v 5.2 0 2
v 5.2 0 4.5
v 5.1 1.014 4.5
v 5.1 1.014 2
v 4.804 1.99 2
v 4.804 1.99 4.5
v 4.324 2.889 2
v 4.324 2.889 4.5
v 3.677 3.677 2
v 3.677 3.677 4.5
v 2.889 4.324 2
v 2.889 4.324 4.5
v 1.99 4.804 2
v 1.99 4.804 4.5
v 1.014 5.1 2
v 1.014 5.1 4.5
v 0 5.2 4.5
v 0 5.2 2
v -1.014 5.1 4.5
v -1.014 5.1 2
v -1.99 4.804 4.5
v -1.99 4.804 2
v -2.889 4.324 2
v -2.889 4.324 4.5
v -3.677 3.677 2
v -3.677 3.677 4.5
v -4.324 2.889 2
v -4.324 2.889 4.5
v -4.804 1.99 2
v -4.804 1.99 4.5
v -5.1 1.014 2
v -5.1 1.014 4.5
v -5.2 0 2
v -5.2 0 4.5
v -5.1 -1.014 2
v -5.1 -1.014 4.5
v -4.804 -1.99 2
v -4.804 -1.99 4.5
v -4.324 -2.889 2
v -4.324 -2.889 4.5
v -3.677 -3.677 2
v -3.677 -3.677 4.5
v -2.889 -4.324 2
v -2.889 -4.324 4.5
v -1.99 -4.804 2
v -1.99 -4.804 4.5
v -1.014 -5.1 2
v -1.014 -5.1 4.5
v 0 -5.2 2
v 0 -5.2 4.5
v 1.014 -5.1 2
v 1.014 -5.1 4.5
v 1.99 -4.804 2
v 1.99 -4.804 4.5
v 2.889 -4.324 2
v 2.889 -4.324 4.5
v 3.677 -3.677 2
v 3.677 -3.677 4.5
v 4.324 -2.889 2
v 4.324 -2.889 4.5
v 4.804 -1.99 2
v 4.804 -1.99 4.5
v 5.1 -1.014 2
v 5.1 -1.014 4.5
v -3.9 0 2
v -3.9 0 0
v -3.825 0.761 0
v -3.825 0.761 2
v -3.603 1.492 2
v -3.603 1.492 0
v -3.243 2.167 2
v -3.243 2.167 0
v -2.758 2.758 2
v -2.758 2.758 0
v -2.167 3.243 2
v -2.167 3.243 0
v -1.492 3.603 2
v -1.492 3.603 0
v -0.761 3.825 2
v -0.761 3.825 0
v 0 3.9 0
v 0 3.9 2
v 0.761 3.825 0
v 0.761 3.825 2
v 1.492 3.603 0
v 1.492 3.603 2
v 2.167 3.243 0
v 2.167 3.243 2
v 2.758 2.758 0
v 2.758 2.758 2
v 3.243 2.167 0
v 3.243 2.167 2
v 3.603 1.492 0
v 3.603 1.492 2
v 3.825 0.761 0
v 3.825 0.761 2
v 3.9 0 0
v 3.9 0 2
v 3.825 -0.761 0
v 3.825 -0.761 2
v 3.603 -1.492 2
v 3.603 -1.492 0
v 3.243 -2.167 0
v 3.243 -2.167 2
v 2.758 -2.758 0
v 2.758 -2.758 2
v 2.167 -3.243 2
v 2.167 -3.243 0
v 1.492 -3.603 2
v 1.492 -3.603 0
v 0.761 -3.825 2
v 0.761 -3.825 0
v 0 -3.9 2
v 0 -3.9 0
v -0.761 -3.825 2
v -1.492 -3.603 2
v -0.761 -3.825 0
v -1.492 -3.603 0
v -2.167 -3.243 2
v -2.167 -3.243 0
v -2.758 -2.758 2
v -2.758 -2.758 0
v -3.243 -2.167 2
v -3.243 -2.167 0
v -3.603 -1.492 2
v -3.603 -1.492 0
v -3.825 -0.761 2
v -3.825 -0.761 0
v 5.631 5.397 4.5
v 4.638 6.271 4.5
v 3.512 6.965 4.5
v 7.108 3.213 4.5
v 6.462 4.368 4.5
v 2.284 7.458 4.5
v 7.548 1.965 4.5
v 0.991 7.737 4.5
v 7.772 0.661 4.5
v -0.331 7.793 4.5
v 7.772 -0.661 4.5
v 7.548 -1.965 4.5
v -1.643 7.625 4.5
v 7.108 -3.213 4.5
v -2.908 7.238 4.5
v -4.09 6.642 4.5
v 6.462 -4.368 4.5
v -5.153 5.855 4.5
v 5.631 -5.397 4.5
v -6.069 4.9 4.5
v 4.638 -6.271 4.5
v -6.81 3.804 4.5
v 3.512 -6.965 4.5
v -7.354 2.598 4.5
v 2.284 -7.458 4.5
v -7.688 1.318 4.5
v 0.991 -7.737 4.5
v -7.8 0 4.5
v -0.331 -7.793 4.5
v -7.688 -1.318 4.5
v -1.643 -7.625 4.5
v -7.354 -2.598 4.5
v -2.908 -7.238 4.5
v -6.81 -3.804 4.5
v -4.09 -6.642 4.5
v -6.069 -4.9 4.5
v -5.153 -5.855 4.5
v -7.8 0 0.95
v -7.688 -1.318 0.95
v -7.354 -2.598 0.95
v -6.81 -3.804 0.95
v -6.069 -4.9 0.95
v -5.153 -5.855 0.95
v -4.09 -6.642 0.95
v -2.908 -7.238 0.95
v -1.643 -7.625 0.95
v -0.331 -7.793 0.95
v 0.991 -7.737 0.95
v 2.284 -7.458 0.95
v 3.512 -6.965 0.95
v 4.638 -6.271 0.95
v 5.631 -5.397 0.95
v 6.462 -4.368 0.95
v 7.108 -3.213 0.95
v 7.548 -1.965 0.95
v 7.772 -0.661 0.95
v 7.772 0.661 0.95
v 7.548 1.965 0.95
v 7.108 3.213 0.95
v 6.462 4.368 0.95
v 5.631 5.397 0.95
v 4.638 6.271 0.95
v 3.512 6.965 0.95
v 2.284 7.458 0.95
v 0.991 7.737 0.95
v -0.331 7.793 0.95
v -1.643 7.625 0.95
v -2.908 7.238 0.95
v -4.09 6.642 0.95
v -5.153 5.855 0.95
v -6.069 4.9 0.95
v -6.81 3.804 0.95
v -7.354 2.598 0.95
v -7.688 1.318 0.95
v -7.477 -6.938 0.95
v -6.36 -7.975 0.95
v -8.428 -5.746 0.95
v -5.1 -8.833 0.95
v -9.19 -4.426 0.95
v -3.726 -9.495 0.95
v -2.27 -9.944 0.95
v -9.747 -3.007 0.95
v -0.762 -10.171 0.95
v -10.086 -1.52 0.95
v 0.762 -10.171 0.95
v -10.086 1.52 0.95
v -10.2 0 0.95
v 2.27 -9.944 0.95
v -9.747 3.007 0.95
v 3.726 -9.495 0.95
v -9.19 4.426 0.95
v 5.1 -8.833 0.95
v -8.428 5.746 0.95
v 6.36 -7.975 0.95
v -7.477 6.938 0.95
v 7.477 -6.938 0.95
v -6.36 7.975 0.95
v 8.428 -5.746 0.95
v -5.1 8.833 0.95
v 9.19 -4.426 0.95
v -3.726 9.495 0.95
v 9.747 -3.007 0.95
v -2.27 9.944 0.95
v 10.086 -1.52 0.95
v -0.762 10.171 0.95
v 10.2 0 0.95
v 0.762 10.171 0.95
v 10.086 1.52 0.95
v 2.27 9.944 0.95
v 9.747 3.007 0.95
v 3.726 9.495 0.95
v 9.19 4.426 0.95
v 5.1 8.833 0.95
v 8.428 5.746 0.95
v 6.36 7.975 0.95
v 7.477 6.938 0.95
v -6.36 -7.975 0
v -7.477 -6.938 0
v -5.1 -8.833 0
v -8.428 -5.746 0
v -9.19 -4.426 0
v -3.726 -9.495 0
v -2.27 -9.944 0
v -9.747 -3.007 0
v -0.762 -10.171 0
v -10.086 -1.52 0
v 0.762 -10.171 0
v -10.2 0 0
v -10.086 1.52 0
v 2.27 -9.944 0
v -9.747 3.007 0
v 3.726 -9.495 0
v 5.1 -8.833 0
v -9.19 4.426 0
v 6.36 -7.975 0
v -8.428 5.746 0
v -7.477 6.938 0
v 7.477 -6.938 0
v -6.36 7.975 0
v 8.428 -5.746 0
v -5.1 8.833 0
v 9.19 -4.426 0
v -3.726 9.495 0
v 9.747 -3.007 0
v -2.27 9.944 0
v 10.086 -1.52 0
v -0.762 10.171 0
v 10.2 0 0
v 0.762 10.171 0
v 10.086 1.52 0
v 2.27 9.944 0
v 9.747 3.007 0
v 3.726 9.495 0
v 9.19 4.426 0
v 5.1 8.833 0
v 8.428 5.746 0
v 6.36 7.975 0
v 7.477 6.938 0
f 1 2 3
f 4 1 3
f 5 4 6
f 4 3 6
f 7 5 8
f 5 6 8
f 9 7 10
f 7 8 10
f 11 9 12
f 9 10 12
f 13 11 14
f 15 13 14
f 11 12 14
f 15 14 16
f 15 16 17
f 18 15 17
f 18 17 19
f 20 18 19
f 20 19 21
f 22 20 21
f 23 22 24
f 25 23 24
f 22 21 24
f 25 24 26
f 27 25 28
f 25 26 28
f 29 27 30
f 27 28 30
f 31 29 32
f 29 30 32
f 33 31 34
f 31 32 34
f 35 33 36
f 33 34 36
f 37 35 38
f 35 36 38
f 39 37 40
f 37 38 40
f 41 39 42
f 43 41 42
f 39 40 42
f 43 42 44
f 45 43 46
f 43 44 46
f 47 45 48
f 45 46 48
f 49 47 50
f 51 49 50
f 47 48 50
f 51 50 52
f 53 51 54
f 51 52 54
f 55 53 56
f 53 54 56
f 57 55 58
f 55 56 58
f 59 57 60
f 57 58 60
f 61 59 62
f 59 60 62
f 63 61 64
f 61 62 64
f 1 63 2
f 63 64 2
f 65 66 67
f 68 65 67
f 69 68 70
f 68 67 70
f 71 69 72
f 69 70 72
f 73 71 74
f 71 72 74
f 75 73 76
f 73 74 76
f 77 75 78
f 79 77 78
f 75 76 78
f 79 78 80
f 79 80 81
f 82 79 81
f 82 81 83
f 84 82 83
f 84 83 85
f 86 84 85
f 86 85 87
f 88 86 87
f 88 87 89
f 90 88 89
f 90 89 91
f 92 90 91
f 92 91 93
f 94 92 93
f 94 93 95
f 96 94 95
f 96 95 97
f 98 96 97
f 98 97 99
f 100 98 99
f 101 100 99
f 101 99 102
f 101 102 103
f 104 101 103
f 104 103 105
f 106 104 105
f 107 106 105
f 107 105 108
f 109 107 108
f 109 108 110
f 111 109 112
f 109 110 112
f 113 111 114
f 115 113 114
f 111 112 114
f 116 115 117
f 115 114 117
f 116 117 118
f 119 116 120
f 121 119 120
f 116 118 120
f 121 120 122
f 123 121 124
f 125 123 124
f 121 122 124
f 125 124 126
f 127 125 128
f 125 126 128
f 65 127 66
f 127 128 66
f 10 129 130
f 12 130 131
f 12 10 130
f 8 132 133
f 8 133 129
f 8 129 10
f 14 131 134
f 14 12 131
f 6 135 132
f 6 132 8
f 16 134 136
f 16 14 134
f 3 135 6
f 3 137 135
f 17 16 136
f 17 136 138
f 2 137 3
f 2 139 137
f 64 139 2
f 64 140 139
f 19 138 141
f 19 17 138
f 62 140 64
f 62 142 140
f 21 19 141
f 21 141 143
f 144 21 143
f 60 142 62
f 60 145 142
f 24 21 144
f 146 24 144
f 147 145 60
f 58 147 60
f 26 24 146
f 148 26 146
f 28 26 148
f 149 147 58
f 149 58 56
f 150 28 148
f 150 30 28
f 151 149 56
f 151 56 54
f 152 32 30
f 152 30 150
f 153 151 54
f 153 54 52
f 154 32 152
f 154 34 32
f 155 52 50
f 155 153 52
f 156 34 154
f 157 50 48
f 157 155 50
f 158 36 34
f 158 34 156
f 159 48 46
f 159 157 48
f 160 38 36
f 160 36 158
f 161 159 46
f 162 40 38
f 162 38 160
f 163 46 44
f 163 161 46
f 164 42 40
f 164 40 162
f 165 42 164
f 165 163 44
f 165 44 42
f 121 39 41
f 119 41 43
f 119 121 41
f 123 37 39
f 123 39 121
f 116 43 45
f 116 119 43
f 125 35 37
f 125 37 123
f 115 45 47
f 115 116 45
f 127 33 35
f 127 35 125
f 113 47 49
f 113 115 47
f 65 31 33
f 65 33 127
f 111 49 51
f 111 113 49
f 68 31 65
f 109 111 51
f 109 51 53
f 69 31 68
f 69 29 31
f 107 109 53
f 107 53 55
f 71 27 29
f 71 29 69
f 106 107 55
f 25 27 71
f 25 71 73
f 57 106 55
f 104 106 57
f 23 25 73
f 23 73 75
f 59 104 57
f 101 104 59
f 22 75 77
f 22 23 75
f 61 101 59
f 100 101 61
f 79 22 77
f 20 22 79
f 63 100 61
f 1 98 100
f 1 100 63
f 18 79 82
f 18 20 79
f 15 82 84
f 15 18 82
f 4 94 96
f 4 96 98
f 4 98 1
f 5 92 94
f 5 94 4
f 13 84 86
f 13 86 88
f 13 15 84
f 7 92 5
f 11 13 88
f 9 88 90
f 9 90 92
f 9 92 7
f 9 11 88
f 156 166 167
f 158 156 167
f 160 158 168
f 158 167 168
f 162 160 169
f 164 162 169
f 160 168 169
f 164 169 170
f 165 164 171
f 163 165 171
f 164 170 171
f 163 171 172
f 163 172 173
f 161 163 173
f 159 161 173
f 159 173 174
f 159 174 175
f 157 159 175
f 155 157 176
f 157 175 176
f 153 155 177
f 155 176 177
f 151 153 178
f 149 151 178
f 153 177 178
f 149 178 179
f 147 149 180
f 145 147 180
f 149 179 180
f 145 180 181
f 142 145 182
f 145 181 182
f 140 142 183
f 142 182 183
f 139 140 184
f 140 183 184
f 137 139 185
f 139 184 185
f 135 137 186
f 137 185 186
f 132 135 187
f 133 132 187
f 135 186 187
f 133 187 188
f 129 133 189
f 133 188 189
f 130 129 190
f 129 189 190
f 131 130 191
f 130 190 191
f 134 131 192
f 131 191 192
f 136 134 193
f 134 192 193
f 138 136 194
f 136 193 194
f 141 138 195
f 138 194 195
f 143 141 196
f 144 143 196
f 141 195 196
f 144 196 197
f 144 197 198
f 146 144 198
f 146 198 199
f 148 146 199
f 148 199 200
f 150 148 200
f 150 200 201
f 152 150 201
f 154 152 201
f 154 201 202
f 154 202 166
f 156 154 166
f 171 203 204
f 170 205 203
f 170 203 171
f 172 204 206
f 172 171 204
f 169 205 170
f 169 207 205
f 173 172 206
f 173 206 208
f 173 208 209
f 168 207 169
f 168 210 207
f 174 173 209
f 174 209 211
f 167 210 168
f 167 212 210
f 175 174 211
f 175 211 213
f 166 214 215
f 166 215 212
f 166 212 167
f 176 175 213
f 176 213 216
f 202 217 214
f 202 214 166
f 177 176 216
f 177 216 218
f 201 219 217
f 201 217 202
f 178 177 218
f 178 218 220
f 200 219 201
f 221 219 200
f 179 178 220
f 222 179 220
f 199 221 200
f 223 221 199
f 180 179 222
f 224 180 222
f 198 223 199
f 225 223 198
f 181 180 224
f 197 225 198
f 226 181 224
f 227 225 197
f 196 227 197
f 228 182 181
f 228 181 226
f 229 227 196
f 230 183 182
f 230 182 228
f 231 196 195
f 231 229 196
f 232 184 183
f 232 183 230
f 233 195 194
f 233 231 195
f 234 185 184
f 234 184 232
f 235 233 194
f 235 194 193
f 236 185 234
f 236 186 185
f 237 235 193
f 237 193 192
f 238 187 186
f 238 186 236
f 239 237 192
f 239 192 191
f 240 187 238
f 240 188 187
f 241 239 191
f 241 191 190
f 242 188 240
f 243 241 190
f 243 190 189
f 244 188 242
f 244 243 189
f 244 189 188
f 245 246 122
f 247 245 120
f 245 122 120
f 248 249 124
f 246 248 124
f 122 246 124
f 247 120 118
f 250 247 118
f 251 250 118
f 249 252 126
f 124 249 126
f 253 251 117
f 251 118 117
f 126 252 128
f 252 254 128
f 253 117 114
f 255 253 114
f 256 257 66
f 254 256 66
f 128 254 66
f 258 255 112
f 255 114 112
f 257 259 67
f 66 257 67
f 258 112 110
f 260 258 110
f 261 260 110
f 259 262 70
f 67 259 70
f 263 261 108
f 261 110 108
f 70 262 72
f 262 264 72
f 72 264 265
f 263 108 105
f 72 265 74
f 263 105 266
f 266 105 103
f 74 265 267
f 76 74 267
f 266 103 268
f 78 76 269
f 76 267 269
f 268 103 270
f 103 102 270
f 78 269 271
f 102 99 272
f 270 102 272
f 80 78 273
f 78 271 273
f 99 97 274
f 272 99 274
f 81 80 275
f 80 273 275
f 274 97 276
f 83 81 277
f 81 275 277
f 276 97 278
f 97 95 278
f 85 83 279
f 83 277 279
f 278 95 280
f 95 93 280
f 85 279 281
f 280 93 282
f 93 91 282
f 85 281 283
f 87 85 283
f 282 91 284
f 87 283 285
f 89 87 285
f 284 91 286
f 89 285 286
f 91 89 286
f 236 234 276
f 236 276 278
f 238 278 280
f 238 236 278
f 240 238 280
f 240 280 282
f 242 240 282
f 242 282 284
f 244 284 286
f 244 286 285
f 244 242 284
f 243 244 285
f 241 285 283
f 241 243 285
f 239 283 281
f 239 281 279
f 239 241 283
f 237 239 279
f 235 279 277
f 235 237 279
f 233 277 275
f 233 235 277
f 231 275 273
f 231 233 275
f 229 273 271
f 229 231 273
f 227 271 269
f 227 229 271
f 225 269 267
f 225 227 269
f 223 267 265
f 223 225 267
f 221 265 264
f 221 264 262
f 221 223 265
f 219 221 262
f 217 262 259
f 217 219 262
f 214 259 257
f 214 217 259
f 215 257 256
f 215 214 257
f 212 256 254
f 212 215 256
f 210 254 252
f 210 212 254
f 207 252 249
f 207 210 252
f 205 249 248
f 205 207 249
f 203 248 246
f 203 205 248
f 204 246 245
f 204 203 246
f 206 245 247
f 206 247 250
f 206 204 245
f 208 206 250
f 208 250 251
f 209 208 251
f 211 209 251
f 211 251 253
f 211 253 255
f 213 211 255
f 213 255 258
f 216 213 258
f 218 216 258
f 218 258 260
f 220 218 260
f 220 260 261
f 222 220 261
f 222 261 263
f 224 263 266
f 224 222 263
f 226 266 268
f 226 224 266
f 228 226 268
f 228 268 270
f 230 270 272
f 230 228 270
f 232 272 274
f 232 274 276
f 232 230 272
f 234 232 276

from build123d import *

# Parameters (mm, degrees)
SKETCH1_R           = 10.2
BOSS_EXTRUDE1_DEPTH = 0.95
SKETCH2_R           = 7.8
BOSS_EXTRUDE2_DEPTH = 3.55
SKETCH3_R           = 5.2
CUT_EXTRUDE1_DEPTH  = 2.5
SKETCH4_R           = 3.9
CUT_EXTRUDE2_DEPTH  = 16.110592311


with BuildPart() as part:
    # Sketch1 → Boss-Extrude1 (new body)
    with BuildSketch(Plane.XY.offset(0.95)):
        Circle(SKETCH1_R)
    extrude(amount=-BOSS_EXTRUDE1_DEPTH)

    # Sketch2 → Boss-Extrude2 (add)
    with BuildSketch(Plane.XY.offset(0.95)):
        with Locations(Location((0, 0, 0), (0, 0, 180))):
            Circle(SKETCH2_R)
    extrude(amount=BOSS_EXTRUDE2_DEPTH)

    # Sketch3 → Cut-Extrude1 (cut)
    with BuildSketch(Plane.XY.offset(4.5)):
        Circle(SKETCH3_R)
    extrude(amount=-CUT_EXTRUDE1_DEPTH, mode=Mode.SUBTRACT)

    # Sketch4 → Cut-Extrude2 (cut, through all)
    with BuildSketch(Plane(origin=(0, 0, 0), x_dir=(-1, 0, 0), z_dir=(0, 0, -1))):
        Circle(SKETCH4_R)
    extrude(amount=-CUT_EXTRUDE2_DEPTH, mode=Mode.SUBTRACT)


solid = part.part
